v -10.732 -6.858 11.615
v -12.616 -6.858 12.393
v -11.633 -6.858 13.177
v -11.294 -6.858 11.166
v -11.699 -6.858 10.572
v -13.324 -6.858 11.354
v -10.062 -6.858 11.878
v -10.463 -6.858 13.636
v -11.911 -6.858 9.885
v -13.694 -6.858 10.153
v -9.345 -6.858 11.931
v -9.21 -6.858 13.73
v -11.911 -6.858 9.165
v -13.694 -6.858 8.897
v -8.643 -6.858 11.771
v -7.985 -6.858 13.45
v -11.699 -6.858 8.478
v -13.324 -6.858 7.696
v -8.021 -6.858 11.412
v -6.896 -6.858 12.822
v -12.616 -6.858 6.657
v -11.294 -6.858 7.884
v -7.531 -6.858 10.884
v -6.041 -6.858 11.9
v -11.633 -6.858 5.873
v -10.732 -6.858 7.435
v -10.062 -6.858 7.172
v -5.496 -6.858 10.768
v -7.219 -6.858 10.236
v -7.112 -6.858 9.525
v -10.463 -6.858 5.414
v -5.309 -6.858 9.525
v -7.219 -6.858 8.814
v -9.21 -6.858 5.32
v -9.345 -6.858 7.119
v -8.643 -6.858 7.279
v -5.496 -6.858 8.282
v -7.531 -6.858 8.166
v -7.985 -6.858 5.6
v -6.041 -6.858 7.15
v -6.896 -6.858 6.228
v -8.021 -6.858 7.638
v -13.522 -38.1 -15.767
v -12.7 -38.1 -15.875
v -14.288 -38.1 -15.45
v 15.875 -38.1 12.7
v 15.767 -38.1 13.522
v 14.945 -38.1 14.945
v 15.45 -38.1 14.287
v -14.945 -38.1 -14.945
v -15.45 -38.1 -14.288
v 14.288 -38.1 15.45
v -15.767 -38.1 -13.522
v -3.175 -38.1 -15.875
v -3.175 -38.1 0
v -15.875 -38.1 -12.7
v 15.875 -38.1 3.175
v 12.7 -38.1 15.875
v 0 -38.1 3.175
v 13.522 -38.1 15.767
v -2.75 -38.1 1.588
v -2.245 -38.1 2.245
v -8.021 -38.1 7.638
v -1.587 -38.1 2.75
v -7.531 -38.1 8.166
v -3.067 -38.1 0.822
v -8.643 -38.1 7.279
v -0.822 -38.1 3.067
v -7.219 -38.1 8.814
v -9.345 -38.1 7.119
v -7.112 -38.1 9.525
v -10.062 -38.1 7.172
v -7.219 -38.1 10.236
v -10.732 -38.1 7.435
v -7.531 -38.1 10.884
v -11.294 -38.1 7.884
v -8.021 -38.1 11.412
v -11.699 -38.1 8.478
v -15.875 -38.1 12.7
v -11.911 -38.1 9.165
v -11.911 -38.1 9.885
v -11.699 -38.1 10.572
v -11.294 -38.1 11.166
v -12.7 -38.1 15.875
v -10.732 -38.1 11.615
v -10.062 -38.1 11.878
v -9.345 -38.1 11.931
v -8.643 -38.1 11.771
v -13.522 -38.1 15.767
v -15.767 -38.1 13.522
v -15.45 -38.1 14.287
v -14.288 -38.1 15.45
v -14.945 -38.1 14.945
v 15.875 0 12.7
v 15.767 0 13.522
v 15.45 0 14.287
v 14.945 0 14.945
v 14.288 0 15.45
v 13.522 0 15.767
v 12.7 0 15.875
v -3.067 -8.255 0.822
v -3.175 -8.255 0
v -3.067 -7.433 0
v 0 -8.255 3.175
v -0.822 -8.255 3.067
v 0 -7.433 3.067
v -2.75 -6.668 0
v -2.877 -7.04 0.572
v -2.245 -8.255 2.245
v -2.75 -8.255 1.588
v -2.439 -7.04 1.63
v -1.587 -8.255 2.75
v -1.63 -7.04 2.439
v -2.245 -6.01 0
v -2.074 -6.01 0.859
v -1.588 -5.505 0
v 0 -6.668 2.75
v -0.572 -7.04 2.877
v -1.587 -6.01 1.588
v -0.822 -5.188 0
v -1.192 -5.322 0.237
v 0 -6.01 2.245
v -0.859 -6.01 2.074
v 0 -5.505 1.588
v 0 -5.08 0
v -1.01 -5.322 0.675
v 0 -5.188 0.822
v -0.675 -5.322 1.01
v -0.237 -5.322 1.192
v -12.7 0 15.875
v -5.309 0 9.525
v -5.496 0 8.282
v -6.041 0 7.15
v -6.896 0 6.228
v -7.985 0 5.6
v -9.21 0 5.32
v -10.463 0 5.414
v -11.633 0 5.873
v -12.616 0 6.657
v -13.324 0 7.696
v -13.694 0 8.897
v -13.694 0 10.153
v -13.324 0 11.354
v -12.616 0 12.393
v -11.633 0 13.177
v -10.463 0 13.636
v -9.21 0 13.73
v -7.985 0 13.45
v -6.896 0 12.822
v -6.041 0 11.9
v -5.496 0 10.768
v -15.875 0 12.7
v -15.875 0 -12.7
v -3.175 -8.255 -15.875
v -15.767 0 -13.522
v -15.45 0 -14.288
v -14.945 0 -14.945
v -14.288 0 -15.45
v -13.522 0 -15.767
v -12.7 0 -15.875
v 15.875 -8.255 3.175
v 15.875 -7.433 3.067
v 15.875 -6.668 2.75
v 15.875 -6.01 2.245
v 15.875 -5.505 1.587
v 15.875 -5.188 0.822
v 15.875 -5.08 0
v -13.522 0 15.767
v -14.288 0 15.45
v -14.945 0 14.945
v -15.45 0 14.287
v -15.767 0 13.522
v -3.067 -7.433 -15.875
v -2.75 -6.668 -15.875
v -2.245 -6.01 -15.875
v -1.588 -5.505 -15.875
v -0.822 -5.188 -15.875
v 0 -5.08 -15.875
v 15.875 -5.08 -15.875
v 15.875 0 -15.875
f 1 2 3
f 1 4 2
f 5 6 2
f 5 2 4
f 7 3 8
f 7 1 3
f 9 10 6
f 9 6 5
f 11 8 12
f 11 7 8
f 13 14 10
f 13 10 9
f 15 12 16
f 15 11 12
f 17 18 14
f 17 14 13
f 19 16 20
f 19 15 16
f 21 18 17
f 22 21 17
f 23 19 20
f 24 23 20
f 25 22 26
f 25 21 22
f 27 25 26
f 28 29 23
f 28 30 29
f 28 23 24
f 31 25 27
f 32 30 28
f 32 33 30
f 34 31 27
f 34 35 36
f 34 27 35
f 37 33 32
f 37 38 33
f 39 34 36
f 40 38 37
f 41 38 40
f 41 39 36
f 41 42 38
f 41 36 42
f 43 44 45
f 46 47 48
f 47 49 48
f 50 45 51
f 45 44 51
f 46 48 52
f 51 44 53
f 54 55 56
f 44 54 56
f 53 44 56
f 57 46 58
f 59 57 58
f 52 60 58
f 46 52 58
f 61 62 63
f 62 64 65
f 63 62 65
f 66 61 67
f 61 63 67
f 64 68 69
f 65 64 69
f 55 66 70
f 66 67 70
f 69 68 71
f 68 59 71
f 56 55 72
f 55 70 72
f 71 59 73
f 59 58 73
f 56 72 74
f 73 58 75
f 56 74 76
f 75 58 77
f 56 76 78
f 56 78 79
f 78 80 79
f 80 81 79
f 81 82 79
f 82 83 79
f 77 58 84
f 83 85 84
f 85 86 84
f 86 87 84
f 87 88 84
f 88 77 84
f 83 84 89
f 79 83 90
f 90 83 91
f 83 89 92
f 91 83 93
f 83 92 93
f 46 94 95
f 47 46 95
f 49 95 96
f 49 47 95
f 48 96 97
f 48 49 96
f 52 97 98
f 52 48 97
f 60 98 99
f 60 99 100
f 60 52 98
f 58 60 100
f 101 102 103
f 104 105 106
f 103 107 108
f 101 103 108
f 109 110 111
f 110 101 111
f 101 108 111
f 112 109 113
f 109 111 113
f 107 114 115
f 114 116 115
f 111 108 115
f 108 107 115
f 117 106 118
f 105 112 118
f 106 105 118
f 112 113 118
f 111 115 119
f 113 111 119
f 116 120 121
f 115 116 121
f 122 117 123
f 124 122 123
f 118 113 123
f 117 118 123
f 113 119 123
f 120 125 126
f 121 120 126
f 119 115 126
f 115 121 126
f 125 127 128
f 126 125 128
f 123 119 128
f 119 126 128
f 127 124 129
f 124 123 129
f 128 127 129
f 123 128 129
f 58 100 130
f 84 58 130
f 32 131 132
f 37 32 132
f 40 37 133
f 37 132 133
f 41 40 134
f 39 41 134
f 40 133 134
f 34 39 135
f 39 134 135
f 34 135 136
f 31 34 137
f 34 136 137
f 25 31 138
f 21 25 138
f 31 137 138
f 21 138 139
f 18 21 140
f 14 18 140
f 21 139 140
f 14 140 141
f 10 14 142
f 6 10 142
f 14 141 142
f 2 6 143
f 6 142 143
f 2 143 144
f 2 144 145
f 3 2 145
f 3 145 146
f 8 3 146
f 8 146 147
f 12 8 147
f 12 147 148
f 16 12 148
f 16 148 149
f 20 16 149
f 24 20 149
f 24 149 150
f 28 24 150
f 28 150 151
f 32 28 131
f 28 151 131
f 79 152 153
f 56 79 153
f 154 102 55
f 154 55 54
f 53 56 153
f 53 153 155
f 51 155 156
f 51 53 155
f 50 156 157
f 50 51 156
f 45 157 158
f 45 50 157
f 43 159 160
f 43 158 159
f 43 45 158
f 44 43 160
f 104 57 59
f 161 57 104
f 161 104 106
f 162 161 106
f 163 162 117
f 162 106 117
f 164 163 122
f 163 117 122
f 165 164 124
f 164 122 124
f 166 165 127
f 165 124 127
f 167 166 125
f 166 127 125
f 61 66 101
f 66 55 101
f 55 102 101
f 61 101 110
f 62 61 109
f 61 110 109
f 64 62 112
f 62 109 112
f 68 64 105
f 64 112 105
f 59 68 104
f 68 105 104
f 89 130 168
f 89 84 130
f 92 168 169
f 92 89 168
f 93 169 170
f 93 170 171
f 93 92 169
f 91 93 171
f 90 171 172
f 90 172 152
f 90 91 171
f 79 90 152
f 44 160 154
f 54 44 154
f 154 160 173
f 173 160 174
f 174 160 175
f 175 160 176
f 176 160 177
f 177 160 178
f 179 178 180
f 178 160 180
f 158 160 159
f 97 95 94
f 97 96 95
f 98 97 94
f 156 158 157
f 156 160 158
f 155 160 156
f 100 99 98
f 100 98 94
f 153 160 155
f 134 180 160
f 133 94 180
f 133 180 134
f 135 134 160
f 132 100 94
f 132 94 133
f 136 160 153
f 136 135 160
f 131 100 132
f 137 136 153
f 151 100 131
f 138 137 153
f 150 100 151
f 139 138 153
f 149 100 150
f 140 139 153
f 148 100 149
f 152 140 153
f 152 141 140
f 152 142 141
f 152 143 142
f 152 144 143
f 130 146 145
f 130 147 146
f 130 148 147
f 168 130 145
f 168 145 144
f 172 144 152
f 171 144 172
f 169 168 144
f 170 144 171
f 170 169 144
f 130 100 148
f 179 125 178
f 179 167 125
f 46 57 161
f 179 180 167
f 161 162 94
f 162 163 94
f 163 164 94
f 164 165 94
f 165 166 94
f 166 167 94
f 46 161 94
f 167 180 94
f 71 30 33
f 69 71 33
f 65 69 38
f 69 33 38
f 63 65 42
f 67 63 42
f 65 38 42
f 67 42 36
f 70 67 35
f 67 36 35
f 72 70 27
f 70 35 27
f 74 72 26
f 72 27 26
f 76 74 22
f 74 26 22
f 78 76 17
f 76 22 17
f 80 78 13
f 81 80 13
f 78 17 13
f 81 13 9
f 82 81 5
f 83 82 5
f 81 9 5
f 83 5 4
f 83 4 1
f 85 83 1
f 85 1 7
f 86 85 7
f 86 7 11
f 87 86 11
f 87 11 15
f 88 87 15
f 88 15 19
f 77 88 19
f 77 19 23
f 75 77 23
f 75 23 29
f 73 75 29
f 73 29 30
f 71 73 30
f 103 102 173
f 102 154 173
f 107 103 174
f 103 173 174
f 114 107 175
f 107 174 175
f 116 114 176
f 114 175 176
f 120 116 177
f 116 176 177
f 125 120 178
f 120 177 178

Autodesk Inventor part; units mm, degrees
ref_plane "YZ Plane" through (0, 0, 0) normal (1, 0, 0) x (0, 1, 0)
ref_plane "XZ Plane" through (0, 0, 0) normal (0, 1, 0) x (-1, 0, 0)
ref_plane "XY Plane" through (0, 0, 0) normal (0, 0, 1) x (1, 0, 0)
sketch "Sketch1" plane through (0, 0, 0) normal (0, 1, 0) x (-1, 0, 0)
  line L0 (-15.875, 15.875) -> (15.875, 15.875)
  line L1 (15.875, 15.875) -> (15.875, -15.875)
  line L2 (15.875, -15.875) -> (-15.875, -15.875)
  line L3 (-15.875, -15.875) -> (-15.875, 15.875)
  line L4 (-15.875, 15.875) -> (15.875, -15.875) construction
  line L5 (15.875, 15.875) -> (-15.875, -15.875) construction
  point P0 (0, 0)
  dimension "width" = 31.75
  dimension "depth" = 31.75
extrude "Extrusion1" add sketch "Sketch1" against normal blind 38.1
sketch "Sketch2" plane through (15.875, 0, 15.875) normal (1, 0, 0) x (0, 0, -1)
  line L0 (0, -38.1) -> (31.75, -38.1) projected
  line L1 (31.75, -38.1) -> (12.7, -38.1)
  line L2 (12.7, -38.1) -> (12.7, -5.08)
  line L3 (12.7, -5.08) -> (31.75, -5.08)
  line L4 (31.75, -5.08) -> (31.75, -38.1)
  point P0 (15.875, 0)
  dimension "dLinkHeight" = 33.02
  dimension "dLinkWidth" = 19.05
extrude "Extrusion2" cut sketch "Sketch2" against normal blind 19.05
sketch "Sketch6" plane through (0, 0, 0) normal (0, 1, 0) x (1, 0, 0)
  line L0 (15.875, 15.875) -> (15.875, -15.875) construction
  line L1 (15.875, -9.525) -> (-15.875, -9.525) construction
  line L2 (-15.875, -15.875) -> (-15.875, 15.875) construction
  line L3 (-9.525, -15.875) -> (-9.525, 15.875) construction
  line L4 (-15.875, 15.875) -> (15.875, 15.875) construction
  line L5 (15.875, -15.875) -> (-15.875, -15.875) construction
  circle A0 centre (-9.525, -9.525) radius 4.2164
  point P0 (0, 0)
  dimension "widthCenterLine" = 6.35
  dimension "depthCenterLine" = 6.35
  dimension "diamHeadCapScrew" = 8.4328
extrude "Extrusion3" cut sketch "Sketch6" against normal blind 6.858
sketch "Sketch7" plane through (-9.525, -6.858, 9.525) normal (0, 1, 0) x (1, 0, 0)
  circle A0 centre (0, 0) radius 2.413
  point P0 (9.525, 9.525)
  dimension "capScrewThroughHole" = 4.826
extrude "Extrusion4" cut sketch "Sketch7" against normal through all
fillet "Fillet1" radius 3.175 1 edges at (-3.175, -21.59, 3.175)
fillet "Fillet2" radius 3.175 3 edges at (-2.2451, -5.08, 2.2451) (-3.175, -5.08, -7.9375) (7.9375, -5.08, 3.175)
fillet "Fillet3" radius 3.175 3 edges at (-15.875, -19.05, 15.875) (-15.875, -19.05, -15.875) (15.875, -19.05, 15.875)
equation "\"widthCenterLine\" = -0.5 * dLinkWidth + 0.5 * width"
equation "\"depthCenterLine\" = -0.5 * dLinkWidth + 0.5 * depth"
equation "\"capScrewSpacing\" = 0.508"
equation "\"depthCapScrewSpacing\" = 0.508"
properties part number "cornerBracketForDLink"
